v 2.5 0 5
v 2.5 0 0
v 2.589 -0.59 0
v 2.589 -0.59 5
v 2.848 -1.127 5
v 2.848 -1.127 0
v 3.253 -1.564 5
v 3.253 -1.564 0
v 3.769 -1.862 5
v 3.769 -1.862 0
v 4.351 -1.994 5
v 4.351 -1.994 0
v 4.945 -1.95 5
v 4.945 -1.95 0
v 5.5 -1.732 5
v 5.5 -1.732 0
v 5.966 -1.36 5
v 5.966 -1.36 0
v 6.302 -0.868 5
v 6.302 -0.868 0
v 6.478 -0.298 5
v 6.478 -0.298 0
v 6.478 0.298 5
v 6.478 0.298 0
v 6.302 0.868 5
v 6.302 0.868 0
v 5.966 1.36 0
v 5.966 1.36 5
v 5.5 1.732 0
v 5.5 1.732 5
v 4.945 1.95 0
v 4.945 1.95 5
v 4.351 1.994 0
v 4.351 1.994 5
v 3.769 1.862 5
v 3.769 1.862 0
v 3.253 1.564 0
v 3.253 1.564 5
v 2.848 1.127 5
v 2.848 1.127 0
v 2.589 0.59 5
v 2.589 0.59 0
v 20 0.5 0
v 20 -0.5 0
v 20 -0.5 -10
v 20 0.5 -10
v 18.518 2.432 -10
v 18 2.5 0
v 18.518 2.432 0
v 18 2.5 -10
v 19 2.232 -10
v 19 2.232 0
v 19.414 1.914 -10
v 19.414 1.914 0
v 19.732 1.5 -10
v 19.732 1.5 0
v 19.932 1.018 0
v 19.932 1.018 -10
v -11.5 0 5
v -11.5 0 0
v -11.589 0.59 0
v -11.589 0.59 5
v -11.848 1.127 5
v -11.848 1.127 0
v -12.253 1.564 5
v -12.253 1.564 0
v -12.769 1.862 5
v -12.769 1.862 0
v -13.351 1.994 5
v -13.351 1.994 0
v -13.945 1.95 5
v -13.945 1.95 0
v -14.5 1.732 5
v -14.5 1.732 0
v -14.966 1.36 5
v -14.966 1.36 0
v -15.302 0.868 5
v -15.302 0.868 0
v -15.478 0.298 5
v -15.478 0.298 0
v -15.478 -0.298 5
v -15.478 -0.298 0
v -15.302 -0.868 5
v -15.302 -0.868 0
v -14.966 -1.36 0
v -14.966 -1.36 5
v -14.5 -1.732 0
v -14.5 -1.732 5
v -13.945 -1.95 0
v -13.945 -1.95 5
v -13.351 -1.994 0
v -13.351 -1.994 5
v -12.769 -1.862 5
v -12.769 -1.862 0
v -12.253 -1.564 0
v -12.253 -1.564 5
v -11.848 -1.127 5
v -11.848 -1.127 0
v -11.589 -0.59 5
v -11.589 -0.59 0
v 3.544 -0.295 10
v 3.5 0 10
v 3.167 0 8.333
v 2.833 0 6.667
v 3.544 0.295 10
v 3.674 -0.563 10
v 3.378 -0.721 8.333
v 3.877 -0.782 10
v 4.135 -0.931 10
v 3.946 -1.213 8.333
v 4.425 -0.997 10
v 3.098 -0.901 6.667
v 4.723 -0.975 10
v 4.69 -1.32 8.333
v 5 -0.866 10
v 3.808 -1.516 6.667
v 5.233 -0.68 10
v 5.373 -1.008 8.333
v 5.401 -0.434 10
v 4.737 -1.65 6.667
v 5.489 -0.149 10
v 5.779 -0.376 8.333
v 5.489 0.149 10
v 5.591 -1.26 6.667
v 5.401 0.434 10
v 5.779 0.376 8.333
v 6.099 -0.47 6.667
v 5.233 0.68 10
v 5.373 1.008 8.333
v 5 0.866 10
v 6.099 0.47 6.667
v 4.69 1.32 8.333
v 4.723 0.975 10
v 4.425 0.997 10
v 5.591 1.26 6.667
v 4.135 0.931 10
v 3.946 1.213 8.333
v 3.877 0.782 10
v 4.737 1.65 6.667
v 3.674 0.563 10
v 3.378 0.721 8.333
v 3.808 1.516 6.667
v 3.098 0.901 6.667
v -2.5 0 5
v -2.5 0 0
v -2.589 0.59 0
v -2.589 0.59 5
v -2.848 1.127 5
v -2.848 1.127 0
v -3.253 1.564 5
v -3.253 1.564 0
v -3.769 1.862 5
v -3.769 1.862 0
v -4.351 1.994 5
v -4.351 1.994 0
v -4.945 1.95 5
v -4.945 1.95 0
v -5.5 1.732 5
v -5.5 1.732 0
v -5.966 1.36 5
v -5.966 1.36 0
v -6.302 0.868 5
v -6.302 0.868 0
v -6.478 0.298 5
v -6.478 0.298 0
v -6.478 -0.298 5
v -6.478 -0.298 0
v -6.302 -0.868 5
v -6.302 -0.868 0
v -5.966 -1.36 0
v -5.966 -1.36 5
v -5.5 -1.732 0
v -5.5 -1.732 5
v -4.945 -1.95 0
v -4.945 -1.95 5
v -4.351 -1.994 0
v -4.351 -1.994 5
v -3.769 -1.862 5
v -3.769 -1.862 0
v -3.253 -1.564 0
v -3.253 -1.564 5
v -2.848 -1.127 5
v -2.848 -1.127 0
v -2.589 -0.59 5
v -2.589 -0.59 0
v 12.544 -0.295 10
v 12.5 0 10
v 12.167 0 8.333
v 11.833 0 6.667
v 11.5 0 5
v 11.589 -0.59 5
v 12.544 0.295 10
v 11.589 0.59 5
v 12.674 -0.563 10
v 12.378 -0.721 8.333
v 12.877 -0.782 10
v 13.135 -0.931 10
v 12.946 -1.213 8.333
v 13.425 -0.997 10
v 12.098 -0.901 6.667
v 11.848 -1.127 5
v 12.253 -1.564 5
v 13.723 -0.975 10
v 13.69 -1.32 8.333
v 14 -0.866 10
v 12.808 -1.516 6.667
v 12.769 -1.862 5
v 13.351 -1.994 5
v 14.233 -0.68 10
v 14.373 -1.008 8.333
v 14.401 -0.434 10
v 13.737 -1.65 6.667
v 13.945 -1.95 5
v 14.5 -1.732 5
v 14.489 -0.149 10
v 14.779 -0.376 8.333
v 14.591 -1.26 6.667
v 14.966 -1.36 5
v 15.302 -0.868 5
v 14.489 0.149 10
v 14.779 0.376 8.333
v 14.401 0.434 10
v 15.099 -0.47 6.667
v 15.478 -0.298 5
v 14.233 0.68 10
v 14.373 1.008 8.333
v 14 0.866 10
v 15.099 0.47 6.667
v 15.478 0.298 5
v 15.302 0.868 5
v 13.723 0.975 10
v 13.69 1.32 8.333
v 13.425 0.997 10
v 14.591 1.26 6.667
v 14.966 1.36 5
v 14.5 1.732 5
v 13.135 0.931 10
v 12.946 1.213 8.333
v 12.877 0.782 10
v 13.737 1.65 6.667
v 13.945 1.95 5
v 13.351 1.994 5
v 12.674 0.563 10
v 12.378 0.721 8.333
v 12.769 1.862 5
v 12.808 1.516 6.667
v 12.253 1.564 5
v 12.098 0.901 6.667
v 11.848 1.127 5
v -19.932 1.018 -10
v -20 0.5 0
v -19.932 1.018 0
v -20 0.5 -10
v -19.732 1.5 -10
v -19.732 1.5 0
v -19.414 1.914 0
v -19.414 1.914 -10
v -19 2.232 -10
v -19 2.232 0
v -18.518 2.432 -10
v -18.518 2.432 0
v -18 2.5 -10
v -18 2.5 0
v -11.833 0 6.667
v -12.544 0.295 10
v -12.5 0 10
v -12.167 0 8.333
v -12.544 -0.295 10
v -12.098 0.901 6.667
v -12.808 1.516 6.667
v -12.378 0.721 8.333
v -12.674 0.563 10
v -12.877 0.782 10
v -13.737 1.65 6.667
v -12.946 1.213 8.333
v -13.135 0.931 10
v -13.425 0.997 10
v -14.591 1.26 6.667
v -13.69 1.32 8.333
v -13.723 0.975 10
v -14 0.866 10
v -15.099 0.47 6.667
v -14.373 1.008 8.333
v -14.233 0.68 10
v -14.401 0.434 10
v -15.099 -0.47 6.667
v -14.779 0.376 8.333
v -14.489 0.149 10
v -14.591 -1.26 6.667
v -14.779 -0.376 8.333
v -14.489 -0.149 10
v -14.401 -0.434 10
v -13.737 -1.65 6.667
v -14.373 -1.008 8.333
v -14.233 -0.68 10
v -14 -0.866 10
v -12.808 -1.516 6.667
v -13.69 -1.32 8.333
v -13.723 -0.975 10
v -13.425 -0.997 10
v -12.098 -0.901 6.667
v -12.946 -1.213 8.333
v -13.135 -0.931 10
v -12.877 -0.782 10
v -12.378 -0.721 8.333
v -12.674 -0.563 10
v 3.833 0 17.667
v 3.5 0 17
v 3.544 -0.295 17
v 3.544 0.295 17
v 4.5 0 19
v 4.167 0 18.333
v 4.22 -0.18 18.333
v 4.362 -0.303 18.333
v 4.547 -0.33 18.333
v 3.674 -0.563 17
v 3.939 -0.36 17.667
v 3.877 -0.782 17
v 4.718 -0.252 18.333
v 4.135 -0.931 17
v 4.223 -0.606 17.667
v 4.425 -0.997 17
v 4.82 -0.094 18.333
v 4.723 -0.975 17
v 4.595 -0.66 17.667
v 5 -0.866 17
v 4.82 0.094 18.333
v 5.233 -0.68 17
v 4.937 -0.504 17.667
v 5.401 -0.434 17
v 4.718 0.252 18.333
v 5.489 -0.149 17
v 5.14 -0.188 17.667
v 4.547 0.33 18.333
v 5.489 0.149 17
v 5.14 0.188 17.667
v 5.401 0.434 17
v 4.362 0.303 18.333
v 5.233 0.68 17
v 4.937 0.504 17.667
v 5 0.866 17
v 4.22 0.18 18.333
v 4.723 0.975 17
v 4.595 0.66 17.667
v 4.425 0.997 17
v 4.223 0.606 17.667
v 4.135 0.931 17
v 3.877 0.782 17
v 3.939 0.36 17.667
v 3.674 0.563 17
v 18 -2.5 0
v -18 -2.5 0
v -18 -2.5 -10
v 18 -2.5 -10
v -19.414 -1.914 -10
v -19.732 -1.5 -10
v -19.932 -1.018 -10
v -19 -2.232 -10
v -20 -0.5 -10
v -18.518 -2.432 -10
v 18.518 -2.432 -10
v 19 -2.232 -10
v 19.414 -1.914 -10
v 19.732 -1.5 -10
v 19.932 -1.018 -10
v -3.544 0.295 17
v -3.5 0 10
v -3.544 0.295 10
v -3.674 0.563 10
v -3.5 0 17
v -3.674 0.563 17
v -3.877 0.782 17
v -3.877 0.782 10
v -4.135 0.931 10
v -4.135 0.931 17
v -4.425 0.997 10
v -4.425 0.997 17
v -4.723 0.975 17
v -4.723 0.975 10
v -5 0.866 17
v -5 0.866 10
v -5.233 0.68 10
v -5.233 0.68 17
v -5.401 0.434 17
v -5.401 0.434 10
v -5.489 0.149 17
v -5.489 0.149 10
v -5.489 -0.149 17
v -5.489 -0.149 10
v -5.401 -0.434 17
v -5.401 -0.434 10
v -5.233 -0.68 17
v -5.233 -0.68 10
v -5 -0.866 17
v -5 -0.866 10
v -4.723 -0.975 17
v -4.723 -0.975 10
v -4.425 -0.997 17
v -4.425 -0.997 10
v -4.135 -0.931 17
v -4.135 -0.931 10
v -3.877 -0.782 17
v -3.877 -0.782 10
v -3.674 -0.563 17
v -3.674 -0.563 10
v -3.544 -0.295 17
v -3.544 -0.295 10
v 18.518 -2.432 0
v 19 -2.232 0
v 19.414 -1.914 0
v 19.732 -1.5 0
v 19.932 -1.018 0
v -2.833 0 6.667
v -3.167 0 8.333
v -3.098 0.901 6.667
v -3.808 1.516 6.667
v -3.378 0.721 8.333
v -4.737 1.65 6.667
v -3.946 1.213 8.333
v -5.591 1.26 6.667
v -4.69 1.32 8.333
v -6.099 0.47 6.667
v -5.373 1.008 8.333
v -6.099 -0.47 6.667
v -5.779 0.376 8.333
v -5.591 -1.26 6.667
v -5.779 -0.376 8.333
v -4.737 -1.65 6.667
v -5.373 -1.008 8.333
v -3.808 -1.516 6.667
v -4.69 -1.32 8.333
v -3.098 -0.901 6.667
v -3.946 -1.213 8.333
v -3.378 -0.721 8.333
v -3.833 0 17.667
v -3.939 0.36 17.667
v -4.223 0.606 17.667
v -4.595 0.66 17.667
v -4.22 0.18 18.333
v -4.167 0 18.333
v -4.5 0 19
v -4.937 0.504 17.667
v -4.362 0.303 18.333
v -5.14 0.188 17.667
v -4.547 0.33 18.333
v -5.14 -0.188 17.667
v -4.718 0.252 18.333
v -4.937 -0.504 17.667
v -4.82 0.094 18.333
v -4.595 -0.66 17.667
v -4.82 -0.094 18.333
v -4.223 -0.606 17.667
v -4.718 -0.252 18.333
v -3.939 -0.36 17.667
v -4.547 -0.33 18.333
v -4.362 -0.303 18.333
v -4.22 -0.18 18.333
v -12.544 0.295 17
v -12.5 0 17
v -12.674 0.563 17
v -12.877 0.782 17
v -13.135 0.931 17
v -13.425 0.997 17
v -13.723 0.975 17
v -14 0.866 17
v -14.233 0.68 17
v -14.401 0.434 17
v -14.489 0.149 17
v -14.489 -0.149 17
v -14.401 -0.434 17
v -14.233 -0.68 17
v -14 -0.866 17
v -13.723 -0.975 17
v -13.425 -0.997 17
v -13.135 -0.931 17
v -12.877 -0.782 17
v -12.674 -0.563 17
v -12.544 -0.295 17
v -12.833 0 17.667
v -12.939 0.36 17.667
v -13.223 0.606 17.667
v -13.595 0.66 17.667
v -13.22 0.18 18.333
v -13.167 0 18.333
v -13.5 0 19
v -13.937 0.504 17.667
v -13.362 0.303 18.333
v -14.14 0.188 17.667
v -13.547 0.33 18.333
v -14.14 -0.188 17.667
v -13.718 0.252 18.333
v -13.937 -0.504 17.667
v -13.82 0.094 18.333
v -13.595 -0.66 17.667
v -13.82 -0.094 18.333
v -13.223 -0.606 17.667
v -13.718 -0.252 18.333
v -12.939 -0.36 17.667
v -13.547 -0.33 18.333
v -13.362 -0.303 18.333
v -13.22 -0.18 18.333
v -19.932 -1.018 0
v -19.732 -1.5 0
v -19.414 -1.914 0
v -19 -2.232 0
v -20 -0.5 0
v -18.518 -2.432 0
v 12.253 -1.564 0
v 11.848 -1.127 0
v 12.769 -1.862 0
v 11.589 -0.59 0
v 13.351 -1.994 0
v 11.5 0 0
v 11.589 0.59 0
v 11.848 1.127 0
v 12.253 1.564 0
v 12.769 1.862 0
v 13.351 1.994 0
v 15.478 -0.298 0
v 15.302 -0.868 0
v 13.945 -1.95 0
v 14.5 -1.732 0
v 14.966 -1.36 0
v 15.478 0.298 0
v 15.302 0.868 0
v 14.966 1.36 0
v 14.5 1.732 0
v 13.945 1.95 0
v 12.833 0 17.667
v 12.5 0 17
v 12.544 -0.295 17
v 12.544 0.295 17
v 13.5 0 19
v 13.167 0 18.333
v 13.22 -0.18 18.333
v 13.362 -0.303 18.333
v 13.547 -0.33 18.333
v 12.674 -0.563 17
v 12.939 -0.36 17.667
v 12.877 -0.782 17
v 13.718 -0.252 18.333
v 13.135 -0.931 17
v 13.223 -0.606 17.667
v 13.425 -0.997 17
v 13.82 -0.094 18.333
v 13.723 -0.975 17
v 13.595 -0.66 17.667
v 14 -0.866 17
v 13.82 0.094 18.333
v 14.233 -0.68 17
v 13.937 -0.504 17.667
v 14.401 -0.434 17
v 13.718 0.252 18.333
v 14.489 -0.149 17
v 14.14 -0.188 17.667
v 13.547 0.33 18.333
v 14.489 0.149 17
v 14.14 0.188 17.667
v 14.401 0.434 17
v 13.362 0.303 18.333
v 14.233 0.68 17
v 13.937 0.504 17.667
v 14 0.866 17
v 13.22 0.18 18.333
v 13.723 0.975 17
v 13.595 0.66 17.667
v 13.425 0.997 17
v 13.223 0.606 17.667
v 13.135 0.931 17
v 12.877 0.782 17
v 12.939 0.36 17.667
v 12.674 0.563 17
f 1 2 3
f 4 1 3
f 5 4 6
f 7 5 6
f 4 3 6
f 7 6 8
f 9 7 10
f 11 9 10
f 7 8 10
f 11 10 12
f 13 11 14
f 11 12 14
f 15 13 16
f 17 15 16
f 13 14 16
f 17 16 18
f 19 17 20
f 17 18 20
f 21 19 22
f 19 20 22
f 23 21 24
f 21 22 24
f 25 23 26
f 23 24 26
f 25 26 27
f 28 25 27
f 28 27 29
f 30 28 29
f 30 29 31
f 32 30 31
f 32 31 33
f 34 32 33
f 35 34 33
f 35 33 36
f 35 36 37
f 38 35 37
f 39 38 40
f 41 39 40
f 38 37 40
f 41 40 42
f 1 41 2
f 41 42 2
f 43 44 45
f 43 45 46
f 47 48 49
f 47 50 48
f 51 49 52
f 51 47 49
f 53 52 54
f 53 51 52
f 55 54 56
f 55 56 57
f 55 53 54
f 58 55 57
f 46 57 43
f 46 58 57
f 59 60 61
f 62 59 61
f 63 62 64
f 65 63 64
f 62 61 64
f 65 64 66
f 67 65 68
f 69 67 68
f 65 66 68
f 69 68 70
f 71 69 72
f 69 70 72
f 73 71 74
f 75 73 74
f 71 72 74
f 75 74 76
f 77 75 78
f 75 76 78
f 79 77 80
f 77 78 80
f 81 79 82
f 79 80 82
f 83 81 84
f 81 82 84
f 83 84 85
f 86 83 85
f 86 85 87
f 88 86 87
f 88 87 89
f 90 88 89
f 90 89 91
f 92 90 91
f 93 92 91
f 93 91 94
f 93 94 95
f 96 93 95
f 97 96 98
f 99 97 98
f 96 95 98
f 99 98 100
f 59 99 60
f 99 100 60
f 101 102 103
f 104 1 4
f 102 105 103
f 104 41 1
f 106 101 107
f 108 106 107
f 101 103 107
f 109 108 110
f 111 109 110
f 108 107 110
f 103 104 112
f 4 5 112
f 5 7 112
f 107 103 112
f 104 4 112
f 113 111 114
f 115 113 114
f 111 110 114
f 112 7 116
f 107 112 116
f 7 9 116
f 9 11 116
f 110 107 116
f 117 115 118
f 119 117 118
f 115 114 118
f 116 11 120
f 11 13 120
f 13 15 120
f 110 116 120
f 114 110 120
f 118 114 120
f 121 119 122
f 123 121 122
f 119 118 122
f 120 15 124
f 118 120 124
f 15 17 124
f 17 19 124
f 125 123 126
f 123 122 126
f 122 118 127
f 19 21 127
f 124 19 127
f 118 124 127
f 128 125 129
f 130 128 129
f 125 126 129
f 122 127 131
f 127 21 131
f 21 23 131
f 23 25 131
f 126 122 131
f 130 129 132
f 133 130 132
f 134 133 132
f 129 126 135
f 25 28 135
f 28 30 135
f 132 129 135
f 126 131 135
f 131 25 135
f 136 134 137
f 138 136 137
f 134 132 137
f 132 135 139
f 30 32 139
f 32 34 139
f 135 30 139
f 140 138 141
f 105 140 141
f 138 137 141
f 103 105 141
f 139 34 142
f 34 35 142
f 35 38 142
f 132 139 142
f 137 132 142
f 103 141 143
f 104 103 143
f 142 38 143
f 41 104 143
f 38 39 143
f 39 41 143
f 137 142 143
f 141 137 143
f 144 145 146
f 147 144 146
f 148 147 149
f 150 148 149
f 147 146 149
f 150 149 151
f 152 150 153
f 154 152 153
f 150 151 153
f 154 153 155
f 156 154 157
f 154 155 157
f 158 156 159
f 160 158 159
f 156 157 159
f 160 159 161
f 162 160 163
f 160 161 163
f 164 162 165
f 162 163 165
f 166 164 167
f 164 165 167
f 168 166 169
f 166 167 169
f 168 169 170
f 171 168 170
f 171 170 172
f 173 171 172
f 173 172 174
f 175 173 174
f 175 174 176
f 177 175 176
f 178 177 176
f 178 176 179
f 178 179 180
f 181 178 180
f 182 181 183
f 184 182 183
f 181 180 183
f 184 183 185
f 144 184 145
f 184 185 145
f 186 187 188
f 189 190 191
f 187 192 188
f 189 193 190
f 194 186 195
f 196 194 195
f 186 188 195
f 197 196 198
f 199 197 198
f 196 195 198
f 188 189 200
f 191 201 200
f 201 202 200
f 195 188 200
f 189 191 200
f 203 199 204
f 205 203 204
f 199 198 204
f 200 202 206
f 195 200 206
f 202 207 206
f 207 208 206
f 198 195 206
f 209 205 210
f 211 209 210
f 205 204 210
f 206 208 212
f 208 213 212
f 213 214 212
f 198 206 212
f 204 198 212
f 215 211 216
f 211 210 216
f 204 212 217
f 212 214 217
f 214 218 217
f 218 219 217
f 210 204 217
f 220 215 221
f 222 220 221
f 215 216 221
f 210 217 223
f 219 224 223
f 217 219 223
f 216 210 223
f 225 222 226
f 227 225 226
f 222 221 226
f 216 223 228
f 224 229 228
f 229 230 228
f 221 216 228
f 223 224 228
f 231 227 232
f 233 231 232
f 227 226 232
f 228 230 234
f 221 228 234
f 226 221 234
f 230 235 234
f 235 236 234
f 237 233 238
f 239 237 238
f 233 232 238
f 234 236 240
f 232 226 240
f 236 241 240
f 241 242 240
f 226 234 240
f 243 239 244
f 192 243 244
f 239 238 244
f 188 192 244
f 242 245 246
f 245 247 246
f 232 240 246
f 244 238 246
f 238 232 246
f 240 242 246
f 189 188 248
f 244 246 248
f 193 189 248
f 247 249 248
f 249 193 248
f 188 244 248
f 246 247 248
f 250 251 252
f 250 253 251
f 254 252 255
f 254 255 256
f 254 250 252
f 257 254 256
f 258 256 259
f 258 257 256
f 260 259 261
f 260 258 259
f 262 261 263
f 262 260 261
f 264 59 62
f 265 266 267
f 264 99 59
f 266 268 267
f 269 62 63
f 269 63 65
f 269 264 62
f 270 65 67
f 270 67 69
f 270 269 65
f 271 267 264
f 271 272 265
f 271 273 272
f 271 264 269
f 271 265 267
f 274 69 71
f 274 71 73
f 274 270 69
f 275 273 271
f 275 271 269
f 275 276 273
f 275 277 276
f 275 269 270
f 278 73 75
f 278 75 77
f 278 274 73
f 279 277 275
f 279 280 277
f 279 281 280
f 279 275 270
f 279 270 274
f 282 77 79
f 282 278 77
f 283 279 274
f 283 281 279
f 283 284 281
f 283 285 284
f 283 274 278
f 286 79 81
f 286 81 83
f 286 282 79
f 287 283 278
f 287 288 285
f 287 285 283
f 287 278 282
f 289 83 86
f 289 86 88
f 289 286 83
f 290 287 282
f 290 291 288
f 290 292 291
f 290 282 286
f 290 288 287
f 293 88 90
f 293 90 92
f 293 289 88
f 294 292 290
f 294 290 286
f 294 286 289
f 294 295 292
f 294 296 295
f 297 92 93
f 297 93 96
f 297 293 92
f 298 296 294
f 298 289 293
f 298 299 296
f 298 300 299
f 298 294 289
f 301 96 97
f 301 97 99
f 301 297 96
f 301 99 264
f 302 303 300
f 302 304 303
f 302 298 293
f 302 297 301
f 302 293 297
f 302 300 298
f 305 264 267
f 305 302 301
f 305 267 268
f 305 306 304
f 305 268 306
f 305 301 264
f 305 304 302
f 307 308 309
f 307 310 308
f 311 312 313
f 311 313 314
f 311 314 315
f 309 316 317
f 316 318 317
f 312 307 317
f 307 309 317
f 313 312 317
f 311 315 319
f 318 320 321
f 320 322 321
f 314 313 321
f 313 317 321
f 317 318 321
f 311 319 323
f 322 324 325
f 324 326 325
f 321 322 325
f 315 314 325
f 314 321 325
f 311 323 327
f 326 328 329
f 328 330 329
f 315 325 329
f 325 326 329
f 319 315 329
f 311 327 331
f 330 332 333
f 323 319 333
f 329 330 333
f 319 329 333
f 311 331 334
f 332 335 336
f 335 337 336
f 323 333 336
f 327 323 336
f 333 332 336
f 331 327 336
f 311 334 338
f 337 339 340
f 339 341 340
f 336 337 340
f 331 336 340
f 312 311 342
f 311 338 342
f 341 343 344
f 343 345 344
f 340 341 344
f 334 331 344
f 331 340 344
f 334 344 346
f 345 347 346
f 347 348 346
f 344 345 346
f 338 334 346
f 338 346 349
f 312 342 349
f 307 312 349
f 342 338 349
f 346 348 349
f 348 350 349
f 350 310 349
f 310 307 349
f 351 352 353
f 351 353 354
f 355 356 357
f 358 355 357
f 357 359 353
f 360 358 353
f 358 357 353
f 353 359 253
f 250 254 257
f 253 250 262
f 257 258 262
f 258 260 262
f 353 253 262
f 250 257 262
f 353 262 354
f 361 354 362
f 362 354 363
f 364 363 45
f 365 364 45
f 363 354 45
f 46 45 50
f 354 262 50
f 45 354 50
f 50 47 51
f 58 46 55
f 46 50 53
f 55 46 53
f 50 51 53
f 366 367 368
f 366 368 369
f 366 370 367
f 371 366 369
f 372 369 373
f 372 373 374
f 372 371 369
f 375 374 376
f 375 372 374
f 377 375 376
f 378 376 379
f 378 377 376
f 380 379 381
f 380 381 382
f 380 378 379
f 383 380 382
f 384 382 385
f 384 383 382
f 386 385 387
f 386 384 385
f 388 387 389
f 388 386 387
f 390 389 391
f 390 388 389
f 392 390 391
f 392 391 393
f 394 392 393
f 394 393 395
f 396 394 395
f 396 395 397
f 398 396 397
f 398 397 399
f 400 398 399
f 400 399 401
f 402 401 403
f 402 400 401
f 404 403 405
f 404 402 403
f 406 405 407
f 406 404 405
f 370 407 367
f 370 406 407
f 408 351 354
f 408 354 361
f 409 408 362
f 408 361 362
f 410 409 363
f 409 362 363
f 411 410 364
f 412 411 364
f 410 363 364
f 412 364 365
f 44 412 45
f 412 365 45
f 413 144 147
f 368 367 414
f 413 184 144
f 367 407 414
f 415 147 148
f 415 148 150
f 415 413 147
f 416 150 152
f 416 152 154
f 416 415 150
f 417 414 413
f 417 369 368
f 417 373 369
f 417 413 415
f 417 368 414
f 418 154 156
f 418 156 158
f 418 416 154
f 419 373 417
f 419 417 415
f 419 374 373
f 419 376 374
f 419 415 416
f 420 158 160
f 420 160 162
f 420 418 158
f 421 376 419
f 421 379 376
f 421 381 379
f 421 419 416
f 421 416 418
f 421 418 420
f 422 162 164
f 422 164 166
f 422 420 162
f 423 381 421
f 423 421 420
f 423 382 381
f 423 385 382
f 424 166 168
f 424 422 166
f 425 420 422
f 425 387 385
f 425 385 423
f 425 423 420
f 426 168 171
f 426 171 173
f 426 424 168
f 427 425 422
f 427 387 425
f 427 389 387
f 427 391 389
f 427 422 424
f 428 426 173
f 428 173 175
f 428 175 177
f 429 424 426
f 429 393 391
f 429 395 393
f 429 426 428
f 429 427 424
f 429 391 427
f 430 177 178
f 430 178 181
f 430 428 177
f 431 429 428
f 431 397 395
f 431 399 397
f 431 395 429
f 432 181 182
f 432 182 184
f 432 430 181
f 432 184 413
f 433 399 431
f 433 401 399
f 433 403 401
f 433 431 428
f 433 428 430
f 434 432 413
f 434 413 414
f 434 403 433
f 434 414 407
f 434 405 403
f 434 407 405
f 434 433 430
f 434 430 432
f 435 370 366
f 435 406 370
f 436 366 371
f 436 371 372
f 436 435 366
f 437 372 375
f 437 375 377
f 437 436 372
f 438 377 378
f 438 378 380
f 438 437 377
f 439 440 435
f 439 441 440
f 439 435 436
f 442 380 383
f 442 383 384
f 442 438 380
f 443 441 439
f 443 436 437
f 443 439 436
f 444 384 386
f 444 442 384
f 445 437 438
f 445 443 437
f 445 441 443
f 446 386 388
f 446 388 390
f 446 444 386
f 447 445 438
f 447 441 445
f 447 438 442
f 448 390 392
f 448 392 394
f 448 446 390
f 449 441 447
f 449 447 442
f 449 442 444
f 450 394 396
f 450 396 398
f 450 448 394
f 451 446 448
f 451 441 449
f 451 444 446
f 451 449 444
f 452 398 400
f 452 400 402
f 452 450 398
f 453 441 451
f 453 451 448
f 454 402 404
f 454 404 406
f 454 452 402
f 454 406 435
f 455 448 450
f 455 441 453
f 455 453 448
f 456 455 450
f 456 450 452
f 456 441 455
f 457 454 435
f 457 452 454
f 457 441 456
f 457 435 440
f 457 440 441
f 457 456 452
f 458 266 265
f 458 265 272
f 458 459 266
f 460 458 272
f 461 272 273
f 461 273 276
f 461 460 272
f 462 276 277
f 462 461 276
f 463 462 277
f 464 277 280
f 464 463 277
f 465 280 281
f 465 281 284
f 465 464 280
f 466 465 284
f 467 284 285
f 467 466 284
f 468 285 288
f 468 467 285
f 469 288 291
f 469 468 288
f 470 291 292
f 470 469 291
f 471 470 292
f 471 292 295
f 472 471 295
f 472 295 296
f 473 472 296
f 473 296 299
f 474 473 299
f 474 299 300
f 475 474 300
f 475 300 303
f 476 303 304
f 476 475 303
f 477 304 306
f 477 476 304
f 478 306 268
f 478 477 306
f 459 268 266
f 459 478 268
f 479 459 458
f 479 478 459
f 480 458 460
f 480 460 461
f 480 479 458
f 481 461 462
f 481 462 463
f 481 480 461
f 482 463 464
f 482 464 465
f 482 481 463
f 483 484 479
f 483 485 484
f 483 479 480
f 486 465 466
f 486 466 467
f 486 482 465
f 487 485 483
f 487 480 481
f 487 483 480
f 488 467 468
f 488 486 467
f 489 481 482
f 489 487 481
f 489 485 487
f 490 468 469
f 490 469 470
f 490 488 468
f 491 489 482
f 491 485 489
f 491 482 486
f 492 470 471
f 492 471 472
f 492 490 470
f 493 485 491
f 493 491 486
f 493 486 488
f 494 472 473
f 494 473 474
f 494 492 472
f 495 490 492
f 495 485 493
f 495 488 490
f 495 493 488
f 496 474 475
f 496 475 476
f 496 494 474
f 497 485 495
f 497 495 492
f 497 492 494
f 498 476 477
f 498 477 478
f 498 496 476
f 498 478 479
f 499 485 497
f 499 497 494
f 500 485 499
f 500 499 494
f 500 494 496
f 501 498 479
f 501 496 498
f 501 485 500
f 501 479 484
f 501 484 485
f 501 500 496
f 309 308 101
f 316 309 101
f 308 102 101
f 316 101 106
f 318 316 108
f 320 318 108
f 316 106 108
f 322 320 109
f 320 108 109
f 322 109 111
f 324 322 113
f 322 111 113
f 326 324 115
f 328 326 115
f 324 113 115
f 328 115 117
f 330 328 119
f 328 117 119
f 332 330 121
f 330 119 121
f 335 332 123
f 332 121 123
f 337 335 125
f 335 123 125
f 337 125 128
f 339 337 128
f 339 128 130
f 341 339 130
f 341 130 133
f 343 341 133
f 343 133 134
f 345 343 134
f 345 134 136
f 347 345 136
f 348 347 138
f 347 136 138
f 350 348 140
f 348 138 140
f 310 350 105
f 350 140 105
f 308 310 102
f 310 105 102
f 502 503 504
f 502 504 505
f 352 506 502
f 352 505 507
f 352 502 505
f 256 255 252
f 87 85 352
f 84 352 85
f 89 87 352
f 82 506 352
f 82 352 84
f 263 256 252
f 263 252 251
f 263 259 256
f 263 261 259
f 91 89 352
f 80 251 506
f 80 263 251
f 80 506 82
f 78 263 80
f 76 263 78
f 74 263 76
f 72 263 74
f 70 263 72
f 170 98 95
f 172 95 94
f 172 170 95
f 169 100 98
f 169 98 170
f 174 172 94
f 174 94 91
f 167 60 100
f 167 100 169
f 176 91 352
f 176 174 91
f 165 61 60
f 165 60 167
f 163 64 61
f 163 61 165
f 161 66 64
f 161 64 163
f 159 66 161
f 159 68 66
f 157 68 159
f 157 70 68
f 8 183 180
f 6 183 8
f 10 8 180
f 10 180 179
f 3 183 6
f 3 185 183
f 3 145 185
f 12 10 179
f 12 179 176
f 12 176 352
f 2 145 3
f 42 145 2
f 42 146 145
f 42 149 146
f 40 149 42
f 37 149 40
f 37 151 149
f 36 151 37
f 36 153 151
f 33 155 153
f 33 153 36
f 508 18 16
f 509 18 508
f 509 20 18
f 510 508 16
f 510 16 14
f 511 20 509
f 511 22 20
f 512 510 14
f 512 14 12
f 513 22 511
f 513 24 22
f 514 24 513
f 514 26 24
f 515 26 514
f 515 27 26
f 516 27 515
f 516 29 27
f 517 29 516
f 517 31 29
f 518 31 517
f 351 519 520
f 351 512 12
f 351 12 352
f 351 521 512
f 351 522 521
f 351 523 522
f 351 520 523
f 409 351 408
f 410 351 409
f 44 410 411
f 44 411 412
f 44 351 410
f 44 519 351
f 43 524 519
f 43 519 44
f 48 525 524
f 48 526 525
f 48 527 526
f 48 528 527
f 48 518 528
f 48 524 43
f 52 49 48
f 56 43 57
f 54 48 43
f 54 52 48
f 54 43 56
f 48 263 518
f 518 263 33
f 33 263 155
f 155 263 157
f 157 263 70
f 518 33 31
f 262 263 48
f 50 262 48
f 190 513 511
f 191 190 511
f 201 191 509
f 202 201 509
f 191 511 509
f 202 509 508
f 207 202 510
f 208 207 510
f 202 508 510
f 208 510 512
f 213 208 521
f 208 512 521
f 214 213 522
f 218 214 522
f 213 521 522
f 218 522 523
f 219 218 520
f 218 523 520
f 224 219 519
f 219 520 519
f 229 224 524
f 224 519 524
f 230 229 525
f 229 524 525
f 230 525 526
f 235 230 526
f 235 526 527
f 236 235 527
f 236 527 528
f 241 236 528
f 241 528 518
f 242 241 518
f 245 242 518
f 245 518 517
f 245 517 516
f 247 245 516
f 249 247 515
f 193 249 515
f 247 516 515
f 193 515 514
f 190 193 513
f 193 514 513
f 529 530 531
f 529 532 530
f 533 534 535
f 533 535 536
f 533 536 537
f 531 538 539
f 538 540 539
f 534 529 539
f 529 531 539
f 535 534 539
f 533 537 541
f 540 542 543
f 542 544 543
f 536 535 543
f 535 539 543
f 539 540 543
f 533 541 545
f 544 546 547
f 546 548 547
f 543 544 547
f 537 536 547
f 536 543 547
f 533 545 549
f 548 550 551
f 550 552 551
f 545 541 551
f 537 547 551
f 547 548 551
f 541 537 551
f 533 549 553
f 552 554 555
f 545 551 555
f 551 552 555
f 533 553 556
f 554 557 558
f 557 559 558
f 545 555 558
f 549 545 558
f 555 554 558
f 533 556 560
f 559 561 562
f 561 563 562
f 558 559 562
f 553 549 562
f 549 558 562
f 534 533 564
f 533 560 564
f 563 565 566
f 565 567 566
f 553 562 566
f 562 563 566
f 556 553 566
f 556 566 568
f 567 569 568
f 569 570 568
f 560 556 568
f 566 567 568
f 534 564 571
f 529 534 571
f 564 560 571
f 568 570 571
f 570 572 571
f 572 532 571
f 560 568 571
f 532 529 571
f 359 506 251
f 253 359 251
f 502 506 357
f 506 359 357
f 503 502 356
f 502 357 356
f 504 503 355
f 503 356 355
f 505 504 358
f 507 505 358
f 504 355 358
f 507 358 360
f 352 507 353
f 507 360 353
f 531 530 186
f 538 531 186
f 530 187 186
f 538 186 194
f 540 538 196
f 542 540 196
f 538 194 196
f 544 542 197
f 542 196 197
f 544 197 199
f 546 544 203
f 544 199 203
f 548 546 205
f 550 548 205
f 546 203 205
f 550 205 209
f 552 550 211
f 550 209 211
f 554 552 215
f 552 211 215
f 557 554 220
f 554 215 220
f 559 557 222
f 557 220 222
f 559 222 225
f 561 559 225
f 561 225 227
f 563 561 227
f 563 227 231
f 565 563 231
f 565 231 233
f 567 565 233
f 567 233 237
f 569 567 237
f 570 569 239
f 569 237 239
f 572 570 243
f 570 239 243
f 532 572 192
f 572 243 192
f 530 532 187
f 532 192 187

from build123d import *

# Parameters (mm, degrees)
F0_W     = 40
F0_H     = 5
F0_R     = 2
F0_R_2   = 1
F1_DEPTH = 10
F3_DEPTH = 5
F8_R     = 2


# Not quite as in the source:
# - a feature names something its author has since deleted; it is built from what else it names


with BuildPart() as f1:
    # F0 (on Top) → F1 (new body)
    with BuildSketch(Plane.XY):
        Rectangle(F0_W, F0_H)
        with Locations((-13.5, 0)):
            Circle(F0_R, mode=Mode.SUBTRACT)
        with BuildLine():
            ThreePointArc((-6.5, 0), (-4.5, 2), (-2.5, 0))
            ThreePointArc((-2.5, 0), (-4.5, -2), (-6.5, 0))
        make_face(mode=Mode.SUBTRACT)
        with BuildLine():
            ThreePointArc((6.5, 0), (4.5, -2), (2.5, 0))
            ThreePointArc((2.5, 0), (4.5, 2), (6.5, 0))
        make_face(mode=Mode.SUBTRACT)
        with BuildLine():
            ThreePointArc((15.5, 0), (13.5, -2), (11.5, 0))
            ThreePointArc((11.5, 0), (13.5, 2), (15.5, 0))
        make_face(mode=Mode.SUBTRACT)
        with BuildLine():
            ThreePointArc((15.5, 0), (13.5, 2), (11.5, 0))
            ThreePointArc((11.5, 0), (13.5, -2), (15.5, 0))
        make_face()
        with BuildLine():
            ThreePointArc((14.5, 0), (13.5, -1), (12.5, 0))
            ThreePointArc((12.5, 0), (13.5, 1), (14.5, 0))
        make_face(mode=Mode.SUBTRACT)
        with Locations((-13.5, 0)):
            Circle(F0_R)
        with Locations((-13.5, 0)):
            Circle(F0_R_2, mode=Mode.SUBTRACT)
        with BuildLine():
            ThreePointArc((14.5, 0), (13.5, 1), (12.5, 0))
            ThreePointArc((12.5, 0), (13.5, -1), (14.5, 0))
        make_face()
        with BuildLine():
            Line((4.5, 0), (3.5, 0))
            ThreePointArc((3.5, 0), (4.5, -1), (5.5, 0))
            Line((5.5, 0), (4.5, 0))
        make_face()
        with BuildLine():
            ThreePointArc((-5.5, 0), (-4.5, -1), (-3.5, 0))
            Line((-3.5, 0), (-4.5, 0))
            Line((-4.5, 0), (-5.5, 0))
        make_face()
        with Locations((-13.5, 0)):
            Circle(F0_R_2)
        with BuildLine():
            Line((-4.5, 0), (-3.5, 0))
            ThreePointArc((-3.5, 0), (-4.5, 1), (-5.5, 0))
            Line((-5.5, 0), (-4.5, 0))
        make_face()
        with BuildLine():
            ThreePointArc((5.5, 0), (4.5, 1), (3.5, 0))
            Line((3.5, 0), (4.5, 0))
            Line((4.5, 0), (5.5, 0))
        make_face()
        with BuildLine():
            ThreePointArc((-6.5, 0), (-4.5, -2), (-2.5, 0))
            Line((-2.5, 0), (-3.5, 0))
            ThreePointArc((-3.5, 0), (-4.5, -1), (-5.5, 0))
            Line((-5.5, 0), (-6.5, 0))
        make_face()
        with BuildLine():
            Line((3.5, 0), (2.5, 0))
            ThreePointArc((2.5, 0), (4.5, -2), (6.5, 0))
            Line((6.5, 0), (5.5, 0))
            ThreePointArc((5.5, 0), (4.5, -1), (3.5, 0))
        make_face()
        with BuildLine():
            ThreePointArc((6.5, 0), (4.5, 2), (2.5, 0))
            Line((2.5, 0), (3.5, 0))
            ThreePointArc((3.5, 0), (4.5, 1), (5.5, 0))
            Line((5.5, 0), (6.5, 0))
        make_face()
        with BuildLine():
            Line((-3.5, 0), (-2.5, 0))
            ThreePointArc((-2.5, 0), (-4.5, 2), (-6.5, 0))
            Line((-6.5, 0), (-5.5, 0))
            ThreePointArc((-5.5, 0), (-4.5, 1), (-3.5, 0))
        make_face()
    extrude(amount=-F1_DEPTH)

    # F0 (on Top) → F3 (join)
    with BuildSketch(Plane.XY):
        with Locations((-13.5, 0)):
            Circle(F0_R)
        with Locations((-13.5, 0)):
            Circle(F0_R_2, mode=Mode.SUBTRACT)
        with BuildLine():
            ThreePointArc((15.5, 0), (13.5, 2), (11.5, 0))
            ThreePointArc((11.5, 0), (13.5, -2), (15.5, 0))
        make_face()
        with BuildLine():
            ThreePointArc((14.5, 0), (13.5, -1), (12.5, 0))
            ThreePointArc((12.5, 0), (13.5, 1), (14.5, 0))
        make_face(mode=Mode.SUBTRACT)
        with BuildLine():
            Line((4.5, 0), (3.5, 0))
            ThreePointArc((3.5, 0), (4.5, -1), (5.5, 0))
            Line((5.5, 0), (4.5, 0))
        make_face()
        with BuildLine():
            ThreePointArc((14.5, 0), (13.5, 1), (12.5, 0))
            ThreePointArc((12.5, 0), (13.5, -1), (14.5, 0))
        make_face()
        with BuildLine():
            ThreePointArc((5.5, 0), (4.5, 1), (3.5, 0))
            Line((3.5, 0), (4.5, 0))
            Line((4.5, 0), (5.5, 0))
        make_face()
        with BuildLine():
            ThreePointArc((-5.5, 0), (-4.5, -1), (-3.5, 0))
            Line((-3.5, 0), (-4.5, 0))
            Line((-4.5, 0), (-5.5, 0))
        make_face()
        with BuildLine():
            Line((-4.5, 0), (-3.5, 0))
            ThreePointArc((-3.5, 0), (-4.5, 1), (-5.5, 0))
            Line((-5.5, 0), (-4.5, 0))
        make_face()
        with Locations((-13.5, 0)):
            Circle(F0_R_2)
        with BuildLine():
            ThreePointArc((-6.5, 0), (-4.5, -2), (-2.5, 0))
            Line((-2.5, 0), (-3.5, 0))
            ThreePointArc((-3.5, 0), (-4.5, -1), (-5.5, 0))
            Line((-5.5, 0), (-6.5, 0))
        make_face()
        with BuildLine():
            Line((-3.5, 0), (-2.5, 0))
            ThreePointArc((-2.5, 0), (-4.5, 2), (-6.5, 0))
            Line((-6.5, 0), (-5.5, 0))
            ThreePointArc((-5.5, 0), (-4.5, 1), (-3.5, 0))
        make_face()
        with BuildLine():
            ThreePointArc((6.5, 0), (4.5, 2), (2.5, 0))
            Line((2.5, 0), (3.5, 0))
            ThreePointArc((3.5, 0), (4.5, 1), (5.5, 0))
            Line((5.5, 0), (6.5, 0))
        make_face()
        with BuildLine():
            Line((3.5, 0), (2.5, 0))
            ThreePointArc((2.5, 0), (4.5, -2), (6.5, 0))
            Line((6.5, 0), (5.5, 0))
            ThreePointArc((5.5, 0), (4.5, -1), (3.5, 0))
        make_face()
    extrude(amount=F3_DEPTH)

    # F2 (on Front) → F4 (revolve)
    with BuildSketch(Plane.XZ):
        Polygon((-13.5, 19), (-13.5, 10), (-12.5, 10), (-12.5, 17), align=None)
        Polygon((-13.5, 10), (-13.5, 5), (-11.5, 5), (-12.5, 10), align=None)
    revolve(axis=Axis((-13.5, 0, 14.5), (0, 0, 1)))

    # F2 (on Front) → F5 (revolve)
    with BuildSketch(Plane.XZ):
        Polygon((-4.5, 19), (-4.5, 10), (-3.5, 10), (-3.5, 17), align=None)
        Polygon((-4.5, 10), (-4.5, 5), (-2.5, 5), (-3.5, 10), align=None)
    revolve(axis=Axis((-4.5, 0, 14.5), (0, 0, 1)))

    # F2 (on Front) → F6 (revolve)
    with BuildSketch(Plane.XZ):
        Polygon((2.5, 5), (4.5, 5), (4.5, 10), (3.5, 10), align=None)
        Polygon((3.5, 10), (4.5, 10), (4.5, 19), (3.5, 17), align=None)
    revolve(axis=Axis((4.5, 0, 14.5), (0, 0, 1)))

    # F2 (on Front) → F7 (revolve)
    with BuildSketch(Plane.XZ):
        Polygon((13.5, 5), (13.5, 10), (13.5, 19), (12.5, 17), (12.5, 10), (11.5, 5), align=None)
    revolve(axis=Axis((13.5, 0, 14.5), (0, 0, 1)))

    # F8
    f8_edges = [f1.edges().sort_by_distance(p)[0] for p in [
        (-20, -2.5, -5),
        (-20, 2.5, -5),
        (20, -2.5, -5),
        (20, 2.5, -5),
    ]]
    fillet(f8_edges, radius=F8_R)


solid = f1.part
